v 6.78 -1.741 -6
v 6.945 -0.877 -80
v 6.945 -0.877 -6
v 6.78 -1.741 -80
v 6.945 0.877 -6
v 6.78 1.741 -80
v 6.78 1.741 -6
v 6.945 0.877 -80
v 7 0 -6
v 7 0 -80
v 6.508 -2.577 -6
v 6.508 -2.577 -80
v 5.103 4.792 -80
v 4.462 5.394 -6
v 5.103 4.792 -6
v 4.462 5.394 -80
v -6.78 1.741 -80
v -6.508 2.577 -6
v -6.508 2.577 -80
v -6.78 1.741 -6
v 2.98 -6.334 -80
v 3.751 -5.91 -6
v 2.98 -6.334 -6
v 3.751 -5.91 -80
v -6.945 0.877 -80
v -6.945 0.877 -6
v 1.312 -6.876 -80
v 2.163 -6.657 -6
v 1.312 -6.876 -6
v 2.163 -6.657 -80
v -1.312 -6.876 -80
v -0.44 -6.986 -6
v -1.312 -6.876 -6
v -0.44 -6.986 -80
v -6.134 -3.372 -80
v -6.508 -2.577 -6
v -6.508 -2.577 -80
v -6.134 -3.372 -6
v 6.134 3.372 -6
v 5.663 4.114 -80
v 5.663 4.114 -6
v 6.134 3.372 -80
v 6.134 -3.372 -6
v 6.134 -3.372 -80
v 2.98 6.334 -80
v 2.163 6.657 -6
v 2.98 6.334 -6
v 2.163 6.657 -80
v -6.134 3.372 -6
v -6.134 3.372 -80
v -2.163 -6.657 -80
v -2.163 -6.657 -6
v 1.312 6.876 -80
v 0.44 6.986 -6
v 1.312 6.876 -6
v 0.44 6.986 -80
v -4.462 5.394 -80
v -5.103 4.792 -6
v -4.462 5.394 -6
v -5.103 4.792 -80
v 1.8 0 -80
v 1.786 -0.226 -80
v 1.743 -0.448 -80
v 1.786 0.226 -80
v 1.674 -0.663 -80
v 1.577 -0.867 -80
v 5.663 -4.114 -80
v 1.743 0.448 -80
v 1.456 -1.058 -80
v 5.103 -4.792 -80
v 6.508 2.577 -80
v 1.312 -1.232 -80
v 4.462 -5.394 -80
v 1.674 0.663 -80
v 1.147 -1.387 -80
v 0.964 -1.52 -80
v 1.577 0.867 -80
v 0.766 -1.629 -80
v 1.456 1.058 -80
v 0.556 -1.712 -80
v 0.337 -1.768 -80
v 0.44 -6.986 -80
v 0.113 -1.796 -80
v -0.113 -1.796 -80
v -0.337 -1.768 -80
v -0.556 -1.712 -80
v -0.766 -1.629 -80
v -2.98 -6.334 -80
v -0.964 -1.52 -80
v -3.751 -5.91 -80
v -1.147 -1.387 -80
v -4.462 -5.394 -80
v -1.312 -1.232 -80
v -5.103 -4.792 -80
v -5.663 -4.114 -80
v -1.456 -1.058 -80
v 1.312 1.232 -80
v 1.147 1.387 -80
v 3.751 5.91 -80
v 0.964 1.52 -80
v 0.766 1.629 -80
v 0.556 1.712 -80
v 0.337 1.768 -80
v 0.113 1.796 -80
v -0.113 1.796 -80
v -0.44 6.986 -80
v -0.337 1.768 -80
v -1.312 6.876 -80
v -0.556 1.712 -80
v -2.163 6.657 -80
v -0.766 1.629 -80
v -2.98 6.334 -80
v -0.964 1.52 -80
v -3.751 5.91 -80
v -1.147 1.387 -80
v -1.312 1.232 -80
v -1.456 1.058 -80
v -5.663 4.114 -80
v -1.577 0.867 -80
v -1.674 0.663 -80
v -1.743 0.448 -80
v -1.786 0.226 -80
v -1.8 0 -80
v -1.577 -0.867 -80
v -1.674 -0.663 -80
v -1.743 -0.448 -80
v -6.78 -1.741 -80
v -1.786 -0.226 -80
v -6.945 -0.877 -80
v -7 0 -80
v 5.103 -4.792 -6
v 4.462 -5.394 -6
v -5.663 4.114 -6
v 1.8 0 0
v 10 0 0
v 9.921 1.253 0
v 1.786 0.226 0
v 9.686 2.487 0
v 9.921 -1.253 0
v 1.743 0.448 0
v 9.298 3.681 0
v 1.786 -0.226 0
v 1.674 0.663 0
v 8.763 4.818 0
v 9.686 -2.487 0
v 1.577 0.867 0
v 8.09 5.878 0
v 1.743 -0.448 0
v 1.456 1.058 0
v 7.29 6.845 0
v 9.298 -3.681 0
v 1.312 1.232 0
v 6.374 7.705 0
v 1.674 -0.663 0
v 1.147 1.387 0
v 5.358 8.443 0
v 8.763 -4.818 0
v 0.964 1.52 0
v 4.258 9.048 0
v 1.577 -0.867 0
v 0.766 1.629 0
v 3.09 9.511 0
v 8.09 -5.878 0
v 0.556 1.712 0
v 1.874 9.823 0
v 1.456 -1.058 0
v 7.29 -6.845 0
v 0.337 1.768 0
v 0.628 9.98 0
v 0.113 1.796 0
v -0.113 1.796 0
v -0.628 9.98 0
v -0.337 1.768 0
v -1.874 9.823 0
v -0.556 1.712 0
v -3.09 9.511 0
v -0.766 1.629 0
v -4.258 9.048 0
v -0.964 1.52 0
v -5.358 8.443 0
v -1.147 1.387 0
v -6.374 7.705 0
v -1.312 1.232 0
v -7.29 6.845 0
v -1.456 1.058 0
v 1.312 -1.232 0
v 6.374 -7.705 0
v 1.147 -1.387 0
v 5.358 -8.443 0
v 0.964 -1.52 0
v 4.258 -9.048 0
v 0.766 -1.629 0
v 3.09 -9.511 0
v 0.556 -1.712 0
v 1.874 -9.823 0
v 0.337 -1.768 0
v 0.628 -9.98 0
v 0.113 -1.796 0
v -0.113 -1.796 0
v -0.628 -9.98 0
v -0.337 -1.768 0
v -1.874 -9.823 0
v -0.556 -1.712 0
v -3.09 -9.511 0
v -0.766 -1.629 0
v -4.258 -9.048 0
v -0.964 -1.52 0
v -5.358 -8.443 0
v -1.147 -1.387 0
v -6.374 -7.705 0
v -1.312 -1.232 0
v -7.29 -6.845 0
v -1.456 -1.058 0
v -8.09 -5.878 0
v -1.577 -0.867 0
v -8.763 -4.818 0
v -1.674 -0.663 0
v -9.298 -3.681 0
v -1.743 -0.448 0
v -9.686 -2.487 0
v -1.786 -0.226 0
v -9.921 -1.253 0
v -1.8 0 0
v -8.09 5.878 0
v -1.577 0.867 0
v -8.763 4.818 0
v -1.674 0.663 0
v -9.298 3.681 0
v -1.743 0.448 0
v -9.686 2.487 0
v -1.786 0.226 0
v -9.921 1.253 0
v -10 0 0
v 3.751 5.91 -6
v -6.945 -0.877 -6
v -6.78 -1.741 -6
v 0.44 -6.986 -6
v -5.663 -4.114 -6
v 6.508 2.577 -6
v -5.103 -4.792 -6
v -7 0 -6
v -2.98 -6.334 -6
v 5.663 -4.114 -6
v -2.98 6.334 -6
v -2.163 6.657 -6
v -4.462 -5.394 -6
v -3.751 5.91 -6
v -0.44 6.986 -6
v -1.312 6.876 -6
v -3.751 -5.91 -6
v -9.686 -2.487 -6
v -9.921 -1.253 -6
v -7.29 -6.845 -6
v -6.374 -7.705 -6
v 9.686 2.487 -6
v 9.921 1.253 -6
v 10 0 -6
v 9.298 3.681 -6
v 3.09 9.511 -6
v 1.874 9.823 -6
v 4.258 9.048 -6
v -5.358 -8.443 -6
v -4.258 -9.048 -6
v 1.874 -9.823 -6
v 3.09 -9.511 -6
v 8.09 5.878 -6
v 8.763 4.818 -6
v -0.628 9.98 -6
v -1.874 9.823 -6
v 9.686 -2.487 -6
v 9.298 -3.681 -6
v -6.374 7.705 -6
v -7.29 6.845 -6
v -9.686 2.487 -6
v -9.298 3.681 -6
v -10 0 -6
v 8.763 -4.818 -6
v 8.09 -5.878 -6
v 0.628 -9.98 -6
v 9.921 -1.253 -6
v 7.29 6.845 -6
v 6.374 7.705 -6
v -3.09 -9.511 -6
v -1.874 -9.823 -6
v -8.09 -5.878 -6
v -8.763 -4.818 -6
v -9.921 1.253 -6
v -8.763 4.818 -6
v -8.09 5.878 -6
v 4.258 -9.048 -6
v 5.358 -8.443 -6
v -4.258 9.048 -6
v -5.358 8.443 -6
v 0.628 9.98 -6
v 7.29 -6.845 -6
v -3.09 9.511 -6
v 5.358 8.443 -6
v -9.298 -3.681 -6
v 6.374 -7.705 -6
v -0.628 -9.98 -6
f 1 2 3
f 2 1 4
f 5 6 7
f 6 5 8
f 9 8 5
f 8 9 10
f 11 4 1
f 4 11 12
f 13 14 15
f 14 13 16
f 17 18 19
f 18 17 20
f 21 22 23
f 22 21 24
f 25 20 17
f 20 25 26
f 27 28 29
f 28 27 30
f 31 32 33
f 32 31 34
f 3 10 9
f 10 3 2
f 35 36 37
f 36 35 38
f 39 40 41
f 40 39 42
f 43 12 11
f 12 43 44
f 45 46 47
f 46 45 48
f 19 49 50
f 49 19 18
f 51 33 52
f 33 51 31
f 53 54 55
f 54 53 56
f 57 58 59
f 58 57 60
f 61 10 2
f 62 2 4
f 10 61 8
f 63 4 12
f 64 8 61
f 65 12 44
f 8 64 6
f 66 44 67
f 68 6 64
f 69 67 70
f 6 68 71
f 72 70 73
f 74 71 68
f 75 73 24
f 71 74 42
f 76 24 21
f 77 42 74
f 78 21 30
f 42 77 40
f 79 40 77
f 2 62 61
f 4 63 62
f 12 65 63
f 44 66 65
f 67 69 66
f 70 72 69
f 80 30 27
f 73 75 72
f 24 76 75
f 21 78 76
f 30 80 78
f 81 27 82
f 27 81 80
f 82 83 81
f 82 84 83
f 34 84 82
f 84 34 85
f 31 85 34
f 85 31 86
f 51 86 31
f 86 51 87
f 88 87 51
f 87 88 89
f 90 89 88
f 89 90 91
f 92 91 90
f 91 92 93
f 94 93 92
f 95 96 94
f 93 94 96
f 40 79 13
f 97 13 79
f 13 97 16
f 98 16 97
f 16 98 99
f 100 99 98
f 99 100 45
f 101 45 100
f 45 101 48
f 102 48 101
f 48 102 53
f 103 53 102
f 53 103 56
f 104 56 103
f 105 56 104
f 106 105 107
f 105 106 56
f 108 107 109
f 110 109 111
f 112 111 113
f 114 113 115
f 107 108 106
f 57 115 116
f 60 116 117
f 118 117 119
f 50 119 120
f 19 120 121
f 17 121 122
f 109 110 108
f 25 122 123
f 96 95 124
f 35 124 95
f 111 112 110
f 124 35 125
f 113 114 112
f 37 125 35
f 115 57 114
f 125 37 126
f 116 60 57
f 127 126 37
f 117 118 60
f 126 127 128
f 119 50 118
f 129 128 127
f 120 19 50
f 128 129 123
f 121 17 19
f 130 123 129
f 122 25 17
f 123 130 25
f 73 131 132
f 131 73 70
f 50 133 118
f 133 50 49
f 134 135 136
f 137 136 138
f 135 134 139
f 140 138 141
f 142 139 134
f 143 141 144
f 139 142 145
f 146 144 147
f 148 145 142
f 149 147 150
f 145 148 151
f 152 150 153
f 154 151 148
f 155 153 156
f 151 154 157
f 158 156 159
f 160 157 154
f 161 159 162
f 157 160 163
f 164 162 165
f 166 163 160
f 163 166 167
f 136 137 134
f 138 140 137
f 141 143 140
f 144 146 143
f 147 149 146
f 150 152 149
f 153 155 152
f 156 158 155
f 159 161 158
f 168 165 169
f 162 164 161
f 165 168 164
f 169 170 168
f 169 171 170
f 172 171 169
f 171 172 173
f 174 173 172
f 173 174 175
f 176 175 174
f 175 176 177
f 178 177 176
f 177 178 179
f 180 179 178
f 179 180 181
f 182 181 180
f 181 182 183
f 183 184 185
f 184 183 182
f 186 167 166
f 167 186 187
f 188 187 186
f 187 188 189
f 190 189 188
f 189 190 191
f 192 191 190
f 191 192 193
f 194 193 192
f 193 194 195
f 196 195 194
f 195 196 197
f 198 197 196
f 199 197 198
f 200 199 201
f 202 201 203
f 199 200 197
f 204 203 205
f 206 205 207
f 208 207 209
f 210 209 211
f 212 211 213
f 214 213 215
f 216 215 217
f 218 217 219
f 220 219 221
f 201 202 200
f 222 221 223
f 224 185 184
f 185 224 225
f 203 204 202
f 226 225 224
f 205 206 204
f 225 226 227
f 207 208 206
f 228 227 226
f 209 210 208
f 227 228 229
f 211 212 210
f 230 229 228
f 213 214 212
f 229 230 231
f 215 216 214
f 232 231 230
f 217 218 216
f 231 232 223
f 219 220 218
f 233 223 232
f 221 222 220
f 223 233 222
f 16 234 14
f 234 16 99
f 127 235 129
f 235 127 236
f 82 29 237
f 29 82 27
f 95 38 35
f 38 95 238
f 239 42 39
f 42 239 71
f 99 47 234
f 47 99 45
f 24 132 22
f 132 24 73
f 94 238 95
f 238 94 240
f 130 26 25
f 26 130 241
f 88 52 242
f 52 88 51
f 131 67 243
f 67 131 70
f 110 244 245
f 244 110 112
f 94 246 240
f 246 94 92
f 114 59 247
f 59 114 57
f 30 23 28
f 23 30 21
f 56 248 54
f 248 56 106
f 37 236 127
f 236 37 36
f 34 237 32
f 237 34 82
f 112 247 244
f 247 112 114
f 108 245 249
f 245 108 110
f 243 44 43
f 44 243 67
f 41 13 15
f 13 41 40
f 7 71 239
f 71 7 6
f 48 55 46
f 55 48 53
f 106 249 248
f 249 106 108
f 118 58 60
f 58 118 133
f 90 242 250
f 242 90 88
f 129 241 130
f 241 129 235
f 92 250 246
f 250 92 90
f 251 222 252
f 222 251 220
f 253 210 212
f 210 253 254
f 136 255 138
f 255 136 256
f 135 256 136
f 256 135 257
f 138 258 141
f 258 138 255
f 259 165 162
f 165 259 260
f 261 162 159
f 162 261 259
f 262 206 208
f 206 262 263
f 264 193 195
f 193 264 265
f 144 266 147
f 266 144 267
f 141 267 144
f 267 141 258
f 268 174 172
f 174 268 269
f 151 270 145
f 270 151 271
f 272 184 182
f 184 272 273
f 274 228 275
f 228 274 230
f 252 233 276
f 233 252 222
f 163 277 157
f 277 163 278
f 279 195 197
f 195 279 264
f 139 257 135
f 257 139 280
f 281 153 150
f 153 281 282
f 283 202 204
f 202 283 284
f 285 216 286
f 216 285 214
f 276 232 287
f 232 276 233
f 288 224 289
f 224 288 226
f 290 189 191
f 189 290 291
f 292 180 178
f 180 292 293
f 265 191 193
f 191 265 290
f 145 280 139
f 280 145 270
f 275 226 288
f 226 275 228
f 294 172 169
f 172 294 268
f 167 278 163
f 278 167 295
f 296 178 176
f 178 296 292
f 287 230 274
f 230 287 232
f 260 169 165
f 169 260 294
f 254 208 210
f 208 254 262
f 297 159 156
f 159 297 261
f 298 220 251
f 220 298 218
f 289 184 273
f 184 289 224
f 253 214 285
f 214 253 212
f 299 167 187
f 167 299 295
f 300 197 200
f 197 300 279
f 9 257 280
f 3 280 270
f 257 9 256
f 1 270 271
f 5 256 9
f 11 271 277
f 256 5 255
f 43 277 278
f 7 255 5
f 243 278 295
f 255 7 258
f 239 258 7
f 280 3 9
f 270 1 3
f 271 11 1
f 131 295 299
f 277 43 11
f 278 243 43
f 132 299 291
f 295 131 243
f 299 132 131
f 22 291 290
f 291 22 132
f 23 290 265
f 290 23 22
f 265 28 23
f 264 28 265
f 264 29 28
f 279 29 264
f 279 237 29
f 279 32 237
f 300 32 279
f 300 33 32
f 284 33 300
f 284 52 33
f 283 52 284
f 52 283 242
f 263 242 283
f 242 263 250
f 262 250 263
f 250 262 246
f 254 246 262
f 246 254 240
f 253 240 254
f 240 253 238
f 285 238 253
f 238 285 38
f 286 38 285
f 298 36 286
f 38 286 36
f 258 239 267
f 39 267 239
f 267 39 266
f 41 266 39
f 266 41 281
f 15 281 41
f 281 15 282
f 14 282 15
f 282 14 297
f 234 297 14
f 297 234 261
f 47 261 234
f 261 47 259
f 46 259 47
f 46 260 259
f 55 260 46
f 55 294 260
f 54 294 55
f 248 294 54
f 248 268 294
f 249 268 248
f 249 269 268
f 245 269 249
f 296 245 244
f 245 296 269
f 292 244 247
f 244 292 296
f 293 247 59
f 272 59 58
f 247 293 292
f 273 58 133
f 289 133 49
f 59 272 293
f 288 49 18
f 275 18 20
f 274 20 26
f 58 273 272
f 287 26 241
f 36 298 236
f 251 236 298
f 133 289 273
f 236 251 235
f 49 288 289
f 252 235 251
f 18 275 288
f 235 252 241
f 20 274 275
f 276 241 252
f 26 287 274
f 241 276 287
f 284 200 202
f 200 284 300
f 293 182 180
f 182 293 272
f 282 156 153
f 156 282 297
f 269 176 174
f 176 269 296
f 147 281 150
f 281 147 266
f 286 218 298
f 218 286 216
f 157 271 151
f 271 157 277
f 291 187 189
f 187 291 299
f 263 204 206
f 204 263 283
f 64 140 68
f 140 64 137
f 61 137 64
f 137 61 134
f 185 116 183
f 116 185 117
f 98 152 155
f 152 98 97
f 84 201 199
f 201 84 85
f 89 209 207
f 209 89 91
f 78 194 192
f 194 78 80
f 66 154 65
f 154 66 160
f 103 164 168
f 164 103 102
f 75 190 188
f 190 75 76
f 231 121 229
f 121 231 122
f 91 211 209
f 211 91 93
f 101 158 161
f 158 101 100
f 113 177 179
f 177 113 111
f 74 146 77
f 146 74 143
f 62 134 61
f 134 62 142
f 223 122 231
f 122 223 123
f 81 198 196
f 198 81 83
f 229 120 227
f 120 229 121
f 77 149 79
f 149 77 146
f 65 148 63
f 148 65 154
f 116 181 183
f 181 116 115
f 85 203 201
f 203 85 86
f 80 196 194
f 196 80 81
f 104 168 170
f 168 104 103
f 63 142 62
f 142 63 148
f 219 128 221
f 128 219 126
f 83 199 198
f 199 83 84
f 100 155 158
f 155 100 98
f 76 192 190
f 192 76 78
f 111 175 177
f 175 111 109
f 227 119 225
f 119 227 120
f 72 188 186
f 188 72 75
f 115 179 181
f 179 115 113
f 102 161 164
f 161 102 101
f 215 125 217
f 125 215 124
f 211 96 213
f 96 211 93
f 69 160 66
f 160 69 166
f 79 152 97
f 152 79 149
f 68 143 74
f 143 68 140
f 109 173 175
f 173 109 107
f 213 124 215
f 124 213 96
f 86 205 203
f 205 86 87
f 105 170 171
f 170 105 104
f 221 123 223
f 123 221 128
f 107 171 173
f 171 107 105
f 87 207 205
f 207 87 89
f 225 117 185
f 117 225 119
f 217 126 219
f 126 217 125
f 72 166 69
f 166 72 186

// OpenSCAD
$fn = 50;


difference() {
	union() {
		translate(v = [0, 0, -80.0000000000]) {
			cylinder(h = 80, r = 7.0000000000);
		}
		translate(v = [0, 0, -6.0000000000]) {
			cylinder(h = 6, r = 10.0000000000);
		}
	}
	union() {
		#translate(v = [0, 0, -80]) {
			cylinder(h = 80, r = 1.8000000000);
		}
	}
}
